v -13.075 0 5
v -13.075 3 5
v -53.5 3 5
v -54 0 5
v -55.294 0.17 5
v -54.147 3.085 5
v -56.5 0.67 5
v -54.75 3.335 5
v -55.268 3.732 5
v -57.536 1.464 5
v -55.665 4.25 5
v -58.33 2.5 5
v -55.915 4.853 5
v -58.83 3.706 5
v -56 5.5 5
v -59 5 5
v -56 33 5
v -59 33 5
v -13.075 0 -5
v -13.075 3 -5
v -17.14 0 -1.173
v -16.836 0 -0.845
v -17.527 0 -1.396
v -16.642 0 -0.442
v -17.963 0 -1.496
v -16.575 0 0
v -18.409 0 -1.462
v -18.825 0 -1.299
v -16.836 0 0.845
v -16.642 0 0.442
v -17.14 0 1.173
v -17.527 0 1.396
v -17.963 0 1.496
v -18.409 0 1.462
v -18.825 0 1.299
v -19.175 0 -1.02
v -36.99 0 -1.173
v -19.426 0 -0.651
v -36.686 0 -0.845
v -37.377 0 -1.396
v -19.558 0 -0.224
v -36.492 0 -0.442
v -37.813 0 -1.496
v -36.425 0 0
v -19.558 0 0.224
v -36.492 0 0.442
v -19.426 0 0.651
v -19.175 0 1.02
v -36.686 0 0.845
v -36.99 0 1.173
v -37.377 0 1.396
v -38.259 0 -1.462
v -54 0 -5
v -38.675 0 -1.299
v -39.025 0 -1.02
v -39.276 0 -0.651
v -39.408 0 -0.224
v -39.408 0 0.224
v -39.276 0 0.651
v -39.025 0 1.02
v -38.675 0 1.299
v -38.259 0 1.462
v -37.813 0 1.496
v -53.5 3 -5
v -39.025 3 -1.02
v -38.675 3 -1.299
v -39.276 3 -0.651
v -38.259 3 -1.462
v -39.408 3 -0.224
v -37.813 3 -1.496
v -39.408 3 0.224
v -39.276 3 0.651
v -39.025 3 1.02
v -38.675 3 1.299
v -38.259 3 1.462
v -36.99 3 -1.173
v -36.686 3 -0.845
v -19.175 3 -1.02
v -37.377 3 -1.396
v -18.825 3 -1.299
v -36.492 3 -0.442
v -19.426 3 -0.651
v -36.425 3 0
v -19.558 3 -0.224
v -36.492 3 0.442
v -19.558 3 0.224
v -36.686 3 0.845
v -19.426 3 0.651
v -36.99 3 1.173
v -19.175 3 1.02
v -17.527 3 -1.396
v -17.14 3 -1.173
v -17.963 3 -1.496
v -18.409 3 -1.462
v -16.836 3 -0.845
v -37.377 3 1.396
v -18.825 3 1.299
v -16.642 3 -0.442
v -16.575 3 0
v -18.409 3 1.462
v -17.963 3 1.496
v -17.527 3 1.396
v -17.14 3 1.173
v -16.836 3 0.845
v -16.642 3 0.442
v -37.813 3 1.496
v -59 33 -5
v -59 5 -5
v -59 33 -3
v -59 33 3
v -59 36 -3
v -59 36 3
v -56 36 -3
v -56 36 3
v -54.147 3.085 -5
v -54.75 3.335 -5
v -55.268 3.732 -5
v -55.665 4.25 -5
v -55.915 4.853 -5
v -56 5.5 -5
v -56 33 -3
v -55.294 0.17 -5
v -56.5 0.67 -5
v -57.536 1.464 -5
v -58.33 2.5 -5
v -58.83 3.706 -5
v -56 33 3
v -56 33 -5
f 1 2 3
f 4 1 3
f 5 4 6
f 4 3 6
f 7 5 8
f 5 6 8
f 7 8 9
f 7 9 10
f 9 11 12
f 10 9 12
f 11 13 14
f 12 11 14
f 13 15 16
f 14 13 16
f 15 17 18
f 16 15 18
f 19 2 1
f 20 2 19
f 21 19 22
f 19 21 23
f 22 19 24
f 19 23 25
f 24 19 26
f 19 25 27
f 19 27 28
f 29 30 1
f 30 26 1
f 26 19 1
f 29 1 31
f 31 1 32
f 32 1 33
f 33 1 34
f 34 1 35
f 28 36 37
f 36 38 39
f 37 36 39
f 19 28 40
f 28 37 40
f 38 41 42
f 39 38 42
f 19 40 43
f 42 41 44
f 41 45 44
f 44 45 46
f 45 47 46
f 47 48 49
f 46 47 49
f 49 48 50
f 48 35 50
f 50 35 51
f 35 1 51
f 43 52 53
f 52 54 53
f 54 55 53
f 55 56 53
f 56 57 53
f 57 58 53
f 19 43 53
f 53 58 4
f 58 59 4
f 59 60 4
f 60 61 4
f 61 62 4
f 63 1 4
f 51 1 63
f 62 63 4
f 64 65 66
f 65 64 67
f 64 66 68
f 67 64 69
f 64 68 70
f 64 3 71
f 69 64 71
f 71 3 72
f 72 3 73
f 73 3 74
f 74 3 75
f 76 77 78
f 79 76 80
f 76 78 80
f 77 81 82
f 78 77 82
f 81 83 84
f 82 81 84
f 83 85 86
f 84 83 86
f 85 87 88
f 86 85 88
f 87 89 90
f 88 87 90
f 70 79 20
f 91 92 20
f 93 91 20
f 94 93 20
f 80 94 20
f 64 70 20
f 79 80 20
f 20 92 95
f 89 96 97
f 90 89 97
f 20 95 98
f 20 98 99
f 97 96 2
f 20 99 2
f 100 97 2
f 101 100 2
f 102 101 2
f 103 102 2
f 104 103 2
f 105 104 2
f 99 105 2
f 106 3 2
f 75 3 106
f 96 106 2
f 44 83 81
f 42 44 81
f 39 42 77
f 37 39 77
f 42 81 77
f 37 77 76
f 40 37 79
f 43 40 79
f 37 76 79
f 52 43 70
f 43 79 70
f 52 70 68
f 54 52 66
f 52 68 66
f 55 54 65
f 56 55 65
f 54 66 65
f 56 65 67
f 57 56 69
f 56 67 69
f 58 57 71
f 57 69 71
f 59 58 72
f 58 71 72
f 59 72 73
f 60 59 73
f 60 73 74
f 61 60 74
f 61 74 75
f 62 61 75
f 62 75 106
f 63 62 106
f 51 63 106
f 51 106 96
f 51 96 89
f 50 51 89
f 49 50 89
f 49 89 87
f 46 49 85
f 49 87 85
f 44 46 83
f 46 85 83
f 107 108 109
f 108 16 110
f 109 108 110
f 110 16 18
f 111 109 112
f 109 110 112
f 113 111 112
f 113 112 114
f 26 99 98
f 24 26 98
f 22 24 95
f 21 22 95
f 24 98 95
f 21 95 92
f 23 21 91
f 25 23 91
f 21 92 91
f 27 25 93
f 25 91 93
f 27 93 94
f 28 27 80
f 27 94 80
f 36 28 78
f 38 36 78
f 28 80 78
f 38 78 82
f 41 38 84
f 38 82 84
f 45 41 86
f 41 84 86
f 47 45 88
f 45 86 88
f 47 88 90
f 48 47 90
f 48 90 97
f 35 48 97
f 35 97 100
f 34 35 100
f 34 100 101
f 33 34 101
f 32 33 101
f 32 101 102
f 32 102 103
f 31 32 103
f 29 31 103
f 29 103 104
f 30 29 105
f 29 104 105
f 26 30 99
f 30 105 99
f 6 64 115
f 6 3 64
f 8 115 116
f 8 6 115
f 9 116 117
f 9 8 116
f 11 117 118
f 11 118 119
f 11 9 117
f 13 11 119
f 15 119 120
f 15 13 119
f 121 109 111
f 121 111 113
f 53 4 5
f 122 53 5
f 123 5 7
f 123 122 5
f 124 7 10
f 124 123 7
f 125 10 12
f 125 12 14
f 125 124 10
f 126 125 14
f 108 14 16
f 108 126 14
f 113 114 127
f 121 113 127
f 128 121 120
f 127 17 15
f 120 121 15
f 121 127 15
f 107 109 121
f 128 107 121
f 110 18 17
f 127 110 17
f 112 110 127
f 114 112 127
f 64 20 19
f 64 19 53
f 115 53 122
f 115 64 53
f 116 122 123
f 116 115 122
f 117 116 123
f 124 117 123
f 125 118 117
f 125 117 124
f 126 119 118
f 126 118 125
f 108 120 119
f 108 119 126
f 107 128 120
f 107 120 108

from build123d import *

# Parameters (mm, degrees)
BOSS_EXTRUDE2_DEPTH = 5
SKETCH8_R           = 1.5
CUT_EXTRUDE3_DEPTH  = 3
FILLET7_R           = 5
FILLET8_R           = 2.5
SKETCH9_W           = 13.075
SKETCH9_H           = 10
CUT_EXTRUDE4_DEPTH  = 3
SKETCH11_W          = 3
SKETCH11_H          = 6
BOSS_EXTRUDE4_DEPTH = 3


with BuildPart() as part:
    # Sketch5 → Boss-Extrude2 (new body, symmetric)
    with BuildSketch(Plane.XY):
        Polygon((0, 3), (0, 0), (-59, 0), (-59, 33), (-56, 33), (-56, 3), align=None)
    extrude(amount=BOSS_EXTRUDE2_DEPTH, both=True)

    # Sketch8 → Cut-Extrude3 (cut)
    with BuildSketch(Plane(origin=(0, 3, 0), x_dir=(1, 0, 0), z_dir=(0, 1, 0))):
        with Locations((-18.075, 0)):
            Circle(SKETCH8_R)
        with Locations((-37.925, 0)):
            Circle(SKETCH8_R)
    extrude(amount=-CUT_EXTRUDE3_DEPTH, mode=Mode.SUBTRACT)

    # Fillet7
    fillet7_edges = [part.edges().sort_by_distance(p)[0] for p in [
        (-59, 0, 0),
    ]]
    fillet(fillet7_edges, radius=FILLET7_R)

    # Fillet8
    fillet8_edges = [part.edges().sort_by_distance(p)[0] for p in [
        (-56, 3, 0),
    ]]
    fillet(fillet8_edges, radius=FILLET8_R)

    # Sketch9 → Cut-Extrude4 (cut)
    with BuildSketch(Plane(origin=(0, 3, 0), x_dir=(1, 0, 0), z_dir=(0, 1, 0))):
        with Locations((-6.5375, 0)):
            Rectangle(SKETCH9_W, SKETCH9_H)
    extrude(amount=-CUT_EXTRUDE4_DEPTH, mode=Mode.SUBTRACT)

    # Sketch11 → Boss-Extrude4 (add)
    with BuildSketch(Plane(origin=(0, 33, 0), x_dir=(1, 0, 0), z_dir=(0, 1, 0))):
        with Locations((-57.5, 0)):
            Rectangle(SKETCH11_W, SKETCH11_H)
    extrude(amount=BOSS_EXTRUDE4_DEPTH)


solid = part.part
